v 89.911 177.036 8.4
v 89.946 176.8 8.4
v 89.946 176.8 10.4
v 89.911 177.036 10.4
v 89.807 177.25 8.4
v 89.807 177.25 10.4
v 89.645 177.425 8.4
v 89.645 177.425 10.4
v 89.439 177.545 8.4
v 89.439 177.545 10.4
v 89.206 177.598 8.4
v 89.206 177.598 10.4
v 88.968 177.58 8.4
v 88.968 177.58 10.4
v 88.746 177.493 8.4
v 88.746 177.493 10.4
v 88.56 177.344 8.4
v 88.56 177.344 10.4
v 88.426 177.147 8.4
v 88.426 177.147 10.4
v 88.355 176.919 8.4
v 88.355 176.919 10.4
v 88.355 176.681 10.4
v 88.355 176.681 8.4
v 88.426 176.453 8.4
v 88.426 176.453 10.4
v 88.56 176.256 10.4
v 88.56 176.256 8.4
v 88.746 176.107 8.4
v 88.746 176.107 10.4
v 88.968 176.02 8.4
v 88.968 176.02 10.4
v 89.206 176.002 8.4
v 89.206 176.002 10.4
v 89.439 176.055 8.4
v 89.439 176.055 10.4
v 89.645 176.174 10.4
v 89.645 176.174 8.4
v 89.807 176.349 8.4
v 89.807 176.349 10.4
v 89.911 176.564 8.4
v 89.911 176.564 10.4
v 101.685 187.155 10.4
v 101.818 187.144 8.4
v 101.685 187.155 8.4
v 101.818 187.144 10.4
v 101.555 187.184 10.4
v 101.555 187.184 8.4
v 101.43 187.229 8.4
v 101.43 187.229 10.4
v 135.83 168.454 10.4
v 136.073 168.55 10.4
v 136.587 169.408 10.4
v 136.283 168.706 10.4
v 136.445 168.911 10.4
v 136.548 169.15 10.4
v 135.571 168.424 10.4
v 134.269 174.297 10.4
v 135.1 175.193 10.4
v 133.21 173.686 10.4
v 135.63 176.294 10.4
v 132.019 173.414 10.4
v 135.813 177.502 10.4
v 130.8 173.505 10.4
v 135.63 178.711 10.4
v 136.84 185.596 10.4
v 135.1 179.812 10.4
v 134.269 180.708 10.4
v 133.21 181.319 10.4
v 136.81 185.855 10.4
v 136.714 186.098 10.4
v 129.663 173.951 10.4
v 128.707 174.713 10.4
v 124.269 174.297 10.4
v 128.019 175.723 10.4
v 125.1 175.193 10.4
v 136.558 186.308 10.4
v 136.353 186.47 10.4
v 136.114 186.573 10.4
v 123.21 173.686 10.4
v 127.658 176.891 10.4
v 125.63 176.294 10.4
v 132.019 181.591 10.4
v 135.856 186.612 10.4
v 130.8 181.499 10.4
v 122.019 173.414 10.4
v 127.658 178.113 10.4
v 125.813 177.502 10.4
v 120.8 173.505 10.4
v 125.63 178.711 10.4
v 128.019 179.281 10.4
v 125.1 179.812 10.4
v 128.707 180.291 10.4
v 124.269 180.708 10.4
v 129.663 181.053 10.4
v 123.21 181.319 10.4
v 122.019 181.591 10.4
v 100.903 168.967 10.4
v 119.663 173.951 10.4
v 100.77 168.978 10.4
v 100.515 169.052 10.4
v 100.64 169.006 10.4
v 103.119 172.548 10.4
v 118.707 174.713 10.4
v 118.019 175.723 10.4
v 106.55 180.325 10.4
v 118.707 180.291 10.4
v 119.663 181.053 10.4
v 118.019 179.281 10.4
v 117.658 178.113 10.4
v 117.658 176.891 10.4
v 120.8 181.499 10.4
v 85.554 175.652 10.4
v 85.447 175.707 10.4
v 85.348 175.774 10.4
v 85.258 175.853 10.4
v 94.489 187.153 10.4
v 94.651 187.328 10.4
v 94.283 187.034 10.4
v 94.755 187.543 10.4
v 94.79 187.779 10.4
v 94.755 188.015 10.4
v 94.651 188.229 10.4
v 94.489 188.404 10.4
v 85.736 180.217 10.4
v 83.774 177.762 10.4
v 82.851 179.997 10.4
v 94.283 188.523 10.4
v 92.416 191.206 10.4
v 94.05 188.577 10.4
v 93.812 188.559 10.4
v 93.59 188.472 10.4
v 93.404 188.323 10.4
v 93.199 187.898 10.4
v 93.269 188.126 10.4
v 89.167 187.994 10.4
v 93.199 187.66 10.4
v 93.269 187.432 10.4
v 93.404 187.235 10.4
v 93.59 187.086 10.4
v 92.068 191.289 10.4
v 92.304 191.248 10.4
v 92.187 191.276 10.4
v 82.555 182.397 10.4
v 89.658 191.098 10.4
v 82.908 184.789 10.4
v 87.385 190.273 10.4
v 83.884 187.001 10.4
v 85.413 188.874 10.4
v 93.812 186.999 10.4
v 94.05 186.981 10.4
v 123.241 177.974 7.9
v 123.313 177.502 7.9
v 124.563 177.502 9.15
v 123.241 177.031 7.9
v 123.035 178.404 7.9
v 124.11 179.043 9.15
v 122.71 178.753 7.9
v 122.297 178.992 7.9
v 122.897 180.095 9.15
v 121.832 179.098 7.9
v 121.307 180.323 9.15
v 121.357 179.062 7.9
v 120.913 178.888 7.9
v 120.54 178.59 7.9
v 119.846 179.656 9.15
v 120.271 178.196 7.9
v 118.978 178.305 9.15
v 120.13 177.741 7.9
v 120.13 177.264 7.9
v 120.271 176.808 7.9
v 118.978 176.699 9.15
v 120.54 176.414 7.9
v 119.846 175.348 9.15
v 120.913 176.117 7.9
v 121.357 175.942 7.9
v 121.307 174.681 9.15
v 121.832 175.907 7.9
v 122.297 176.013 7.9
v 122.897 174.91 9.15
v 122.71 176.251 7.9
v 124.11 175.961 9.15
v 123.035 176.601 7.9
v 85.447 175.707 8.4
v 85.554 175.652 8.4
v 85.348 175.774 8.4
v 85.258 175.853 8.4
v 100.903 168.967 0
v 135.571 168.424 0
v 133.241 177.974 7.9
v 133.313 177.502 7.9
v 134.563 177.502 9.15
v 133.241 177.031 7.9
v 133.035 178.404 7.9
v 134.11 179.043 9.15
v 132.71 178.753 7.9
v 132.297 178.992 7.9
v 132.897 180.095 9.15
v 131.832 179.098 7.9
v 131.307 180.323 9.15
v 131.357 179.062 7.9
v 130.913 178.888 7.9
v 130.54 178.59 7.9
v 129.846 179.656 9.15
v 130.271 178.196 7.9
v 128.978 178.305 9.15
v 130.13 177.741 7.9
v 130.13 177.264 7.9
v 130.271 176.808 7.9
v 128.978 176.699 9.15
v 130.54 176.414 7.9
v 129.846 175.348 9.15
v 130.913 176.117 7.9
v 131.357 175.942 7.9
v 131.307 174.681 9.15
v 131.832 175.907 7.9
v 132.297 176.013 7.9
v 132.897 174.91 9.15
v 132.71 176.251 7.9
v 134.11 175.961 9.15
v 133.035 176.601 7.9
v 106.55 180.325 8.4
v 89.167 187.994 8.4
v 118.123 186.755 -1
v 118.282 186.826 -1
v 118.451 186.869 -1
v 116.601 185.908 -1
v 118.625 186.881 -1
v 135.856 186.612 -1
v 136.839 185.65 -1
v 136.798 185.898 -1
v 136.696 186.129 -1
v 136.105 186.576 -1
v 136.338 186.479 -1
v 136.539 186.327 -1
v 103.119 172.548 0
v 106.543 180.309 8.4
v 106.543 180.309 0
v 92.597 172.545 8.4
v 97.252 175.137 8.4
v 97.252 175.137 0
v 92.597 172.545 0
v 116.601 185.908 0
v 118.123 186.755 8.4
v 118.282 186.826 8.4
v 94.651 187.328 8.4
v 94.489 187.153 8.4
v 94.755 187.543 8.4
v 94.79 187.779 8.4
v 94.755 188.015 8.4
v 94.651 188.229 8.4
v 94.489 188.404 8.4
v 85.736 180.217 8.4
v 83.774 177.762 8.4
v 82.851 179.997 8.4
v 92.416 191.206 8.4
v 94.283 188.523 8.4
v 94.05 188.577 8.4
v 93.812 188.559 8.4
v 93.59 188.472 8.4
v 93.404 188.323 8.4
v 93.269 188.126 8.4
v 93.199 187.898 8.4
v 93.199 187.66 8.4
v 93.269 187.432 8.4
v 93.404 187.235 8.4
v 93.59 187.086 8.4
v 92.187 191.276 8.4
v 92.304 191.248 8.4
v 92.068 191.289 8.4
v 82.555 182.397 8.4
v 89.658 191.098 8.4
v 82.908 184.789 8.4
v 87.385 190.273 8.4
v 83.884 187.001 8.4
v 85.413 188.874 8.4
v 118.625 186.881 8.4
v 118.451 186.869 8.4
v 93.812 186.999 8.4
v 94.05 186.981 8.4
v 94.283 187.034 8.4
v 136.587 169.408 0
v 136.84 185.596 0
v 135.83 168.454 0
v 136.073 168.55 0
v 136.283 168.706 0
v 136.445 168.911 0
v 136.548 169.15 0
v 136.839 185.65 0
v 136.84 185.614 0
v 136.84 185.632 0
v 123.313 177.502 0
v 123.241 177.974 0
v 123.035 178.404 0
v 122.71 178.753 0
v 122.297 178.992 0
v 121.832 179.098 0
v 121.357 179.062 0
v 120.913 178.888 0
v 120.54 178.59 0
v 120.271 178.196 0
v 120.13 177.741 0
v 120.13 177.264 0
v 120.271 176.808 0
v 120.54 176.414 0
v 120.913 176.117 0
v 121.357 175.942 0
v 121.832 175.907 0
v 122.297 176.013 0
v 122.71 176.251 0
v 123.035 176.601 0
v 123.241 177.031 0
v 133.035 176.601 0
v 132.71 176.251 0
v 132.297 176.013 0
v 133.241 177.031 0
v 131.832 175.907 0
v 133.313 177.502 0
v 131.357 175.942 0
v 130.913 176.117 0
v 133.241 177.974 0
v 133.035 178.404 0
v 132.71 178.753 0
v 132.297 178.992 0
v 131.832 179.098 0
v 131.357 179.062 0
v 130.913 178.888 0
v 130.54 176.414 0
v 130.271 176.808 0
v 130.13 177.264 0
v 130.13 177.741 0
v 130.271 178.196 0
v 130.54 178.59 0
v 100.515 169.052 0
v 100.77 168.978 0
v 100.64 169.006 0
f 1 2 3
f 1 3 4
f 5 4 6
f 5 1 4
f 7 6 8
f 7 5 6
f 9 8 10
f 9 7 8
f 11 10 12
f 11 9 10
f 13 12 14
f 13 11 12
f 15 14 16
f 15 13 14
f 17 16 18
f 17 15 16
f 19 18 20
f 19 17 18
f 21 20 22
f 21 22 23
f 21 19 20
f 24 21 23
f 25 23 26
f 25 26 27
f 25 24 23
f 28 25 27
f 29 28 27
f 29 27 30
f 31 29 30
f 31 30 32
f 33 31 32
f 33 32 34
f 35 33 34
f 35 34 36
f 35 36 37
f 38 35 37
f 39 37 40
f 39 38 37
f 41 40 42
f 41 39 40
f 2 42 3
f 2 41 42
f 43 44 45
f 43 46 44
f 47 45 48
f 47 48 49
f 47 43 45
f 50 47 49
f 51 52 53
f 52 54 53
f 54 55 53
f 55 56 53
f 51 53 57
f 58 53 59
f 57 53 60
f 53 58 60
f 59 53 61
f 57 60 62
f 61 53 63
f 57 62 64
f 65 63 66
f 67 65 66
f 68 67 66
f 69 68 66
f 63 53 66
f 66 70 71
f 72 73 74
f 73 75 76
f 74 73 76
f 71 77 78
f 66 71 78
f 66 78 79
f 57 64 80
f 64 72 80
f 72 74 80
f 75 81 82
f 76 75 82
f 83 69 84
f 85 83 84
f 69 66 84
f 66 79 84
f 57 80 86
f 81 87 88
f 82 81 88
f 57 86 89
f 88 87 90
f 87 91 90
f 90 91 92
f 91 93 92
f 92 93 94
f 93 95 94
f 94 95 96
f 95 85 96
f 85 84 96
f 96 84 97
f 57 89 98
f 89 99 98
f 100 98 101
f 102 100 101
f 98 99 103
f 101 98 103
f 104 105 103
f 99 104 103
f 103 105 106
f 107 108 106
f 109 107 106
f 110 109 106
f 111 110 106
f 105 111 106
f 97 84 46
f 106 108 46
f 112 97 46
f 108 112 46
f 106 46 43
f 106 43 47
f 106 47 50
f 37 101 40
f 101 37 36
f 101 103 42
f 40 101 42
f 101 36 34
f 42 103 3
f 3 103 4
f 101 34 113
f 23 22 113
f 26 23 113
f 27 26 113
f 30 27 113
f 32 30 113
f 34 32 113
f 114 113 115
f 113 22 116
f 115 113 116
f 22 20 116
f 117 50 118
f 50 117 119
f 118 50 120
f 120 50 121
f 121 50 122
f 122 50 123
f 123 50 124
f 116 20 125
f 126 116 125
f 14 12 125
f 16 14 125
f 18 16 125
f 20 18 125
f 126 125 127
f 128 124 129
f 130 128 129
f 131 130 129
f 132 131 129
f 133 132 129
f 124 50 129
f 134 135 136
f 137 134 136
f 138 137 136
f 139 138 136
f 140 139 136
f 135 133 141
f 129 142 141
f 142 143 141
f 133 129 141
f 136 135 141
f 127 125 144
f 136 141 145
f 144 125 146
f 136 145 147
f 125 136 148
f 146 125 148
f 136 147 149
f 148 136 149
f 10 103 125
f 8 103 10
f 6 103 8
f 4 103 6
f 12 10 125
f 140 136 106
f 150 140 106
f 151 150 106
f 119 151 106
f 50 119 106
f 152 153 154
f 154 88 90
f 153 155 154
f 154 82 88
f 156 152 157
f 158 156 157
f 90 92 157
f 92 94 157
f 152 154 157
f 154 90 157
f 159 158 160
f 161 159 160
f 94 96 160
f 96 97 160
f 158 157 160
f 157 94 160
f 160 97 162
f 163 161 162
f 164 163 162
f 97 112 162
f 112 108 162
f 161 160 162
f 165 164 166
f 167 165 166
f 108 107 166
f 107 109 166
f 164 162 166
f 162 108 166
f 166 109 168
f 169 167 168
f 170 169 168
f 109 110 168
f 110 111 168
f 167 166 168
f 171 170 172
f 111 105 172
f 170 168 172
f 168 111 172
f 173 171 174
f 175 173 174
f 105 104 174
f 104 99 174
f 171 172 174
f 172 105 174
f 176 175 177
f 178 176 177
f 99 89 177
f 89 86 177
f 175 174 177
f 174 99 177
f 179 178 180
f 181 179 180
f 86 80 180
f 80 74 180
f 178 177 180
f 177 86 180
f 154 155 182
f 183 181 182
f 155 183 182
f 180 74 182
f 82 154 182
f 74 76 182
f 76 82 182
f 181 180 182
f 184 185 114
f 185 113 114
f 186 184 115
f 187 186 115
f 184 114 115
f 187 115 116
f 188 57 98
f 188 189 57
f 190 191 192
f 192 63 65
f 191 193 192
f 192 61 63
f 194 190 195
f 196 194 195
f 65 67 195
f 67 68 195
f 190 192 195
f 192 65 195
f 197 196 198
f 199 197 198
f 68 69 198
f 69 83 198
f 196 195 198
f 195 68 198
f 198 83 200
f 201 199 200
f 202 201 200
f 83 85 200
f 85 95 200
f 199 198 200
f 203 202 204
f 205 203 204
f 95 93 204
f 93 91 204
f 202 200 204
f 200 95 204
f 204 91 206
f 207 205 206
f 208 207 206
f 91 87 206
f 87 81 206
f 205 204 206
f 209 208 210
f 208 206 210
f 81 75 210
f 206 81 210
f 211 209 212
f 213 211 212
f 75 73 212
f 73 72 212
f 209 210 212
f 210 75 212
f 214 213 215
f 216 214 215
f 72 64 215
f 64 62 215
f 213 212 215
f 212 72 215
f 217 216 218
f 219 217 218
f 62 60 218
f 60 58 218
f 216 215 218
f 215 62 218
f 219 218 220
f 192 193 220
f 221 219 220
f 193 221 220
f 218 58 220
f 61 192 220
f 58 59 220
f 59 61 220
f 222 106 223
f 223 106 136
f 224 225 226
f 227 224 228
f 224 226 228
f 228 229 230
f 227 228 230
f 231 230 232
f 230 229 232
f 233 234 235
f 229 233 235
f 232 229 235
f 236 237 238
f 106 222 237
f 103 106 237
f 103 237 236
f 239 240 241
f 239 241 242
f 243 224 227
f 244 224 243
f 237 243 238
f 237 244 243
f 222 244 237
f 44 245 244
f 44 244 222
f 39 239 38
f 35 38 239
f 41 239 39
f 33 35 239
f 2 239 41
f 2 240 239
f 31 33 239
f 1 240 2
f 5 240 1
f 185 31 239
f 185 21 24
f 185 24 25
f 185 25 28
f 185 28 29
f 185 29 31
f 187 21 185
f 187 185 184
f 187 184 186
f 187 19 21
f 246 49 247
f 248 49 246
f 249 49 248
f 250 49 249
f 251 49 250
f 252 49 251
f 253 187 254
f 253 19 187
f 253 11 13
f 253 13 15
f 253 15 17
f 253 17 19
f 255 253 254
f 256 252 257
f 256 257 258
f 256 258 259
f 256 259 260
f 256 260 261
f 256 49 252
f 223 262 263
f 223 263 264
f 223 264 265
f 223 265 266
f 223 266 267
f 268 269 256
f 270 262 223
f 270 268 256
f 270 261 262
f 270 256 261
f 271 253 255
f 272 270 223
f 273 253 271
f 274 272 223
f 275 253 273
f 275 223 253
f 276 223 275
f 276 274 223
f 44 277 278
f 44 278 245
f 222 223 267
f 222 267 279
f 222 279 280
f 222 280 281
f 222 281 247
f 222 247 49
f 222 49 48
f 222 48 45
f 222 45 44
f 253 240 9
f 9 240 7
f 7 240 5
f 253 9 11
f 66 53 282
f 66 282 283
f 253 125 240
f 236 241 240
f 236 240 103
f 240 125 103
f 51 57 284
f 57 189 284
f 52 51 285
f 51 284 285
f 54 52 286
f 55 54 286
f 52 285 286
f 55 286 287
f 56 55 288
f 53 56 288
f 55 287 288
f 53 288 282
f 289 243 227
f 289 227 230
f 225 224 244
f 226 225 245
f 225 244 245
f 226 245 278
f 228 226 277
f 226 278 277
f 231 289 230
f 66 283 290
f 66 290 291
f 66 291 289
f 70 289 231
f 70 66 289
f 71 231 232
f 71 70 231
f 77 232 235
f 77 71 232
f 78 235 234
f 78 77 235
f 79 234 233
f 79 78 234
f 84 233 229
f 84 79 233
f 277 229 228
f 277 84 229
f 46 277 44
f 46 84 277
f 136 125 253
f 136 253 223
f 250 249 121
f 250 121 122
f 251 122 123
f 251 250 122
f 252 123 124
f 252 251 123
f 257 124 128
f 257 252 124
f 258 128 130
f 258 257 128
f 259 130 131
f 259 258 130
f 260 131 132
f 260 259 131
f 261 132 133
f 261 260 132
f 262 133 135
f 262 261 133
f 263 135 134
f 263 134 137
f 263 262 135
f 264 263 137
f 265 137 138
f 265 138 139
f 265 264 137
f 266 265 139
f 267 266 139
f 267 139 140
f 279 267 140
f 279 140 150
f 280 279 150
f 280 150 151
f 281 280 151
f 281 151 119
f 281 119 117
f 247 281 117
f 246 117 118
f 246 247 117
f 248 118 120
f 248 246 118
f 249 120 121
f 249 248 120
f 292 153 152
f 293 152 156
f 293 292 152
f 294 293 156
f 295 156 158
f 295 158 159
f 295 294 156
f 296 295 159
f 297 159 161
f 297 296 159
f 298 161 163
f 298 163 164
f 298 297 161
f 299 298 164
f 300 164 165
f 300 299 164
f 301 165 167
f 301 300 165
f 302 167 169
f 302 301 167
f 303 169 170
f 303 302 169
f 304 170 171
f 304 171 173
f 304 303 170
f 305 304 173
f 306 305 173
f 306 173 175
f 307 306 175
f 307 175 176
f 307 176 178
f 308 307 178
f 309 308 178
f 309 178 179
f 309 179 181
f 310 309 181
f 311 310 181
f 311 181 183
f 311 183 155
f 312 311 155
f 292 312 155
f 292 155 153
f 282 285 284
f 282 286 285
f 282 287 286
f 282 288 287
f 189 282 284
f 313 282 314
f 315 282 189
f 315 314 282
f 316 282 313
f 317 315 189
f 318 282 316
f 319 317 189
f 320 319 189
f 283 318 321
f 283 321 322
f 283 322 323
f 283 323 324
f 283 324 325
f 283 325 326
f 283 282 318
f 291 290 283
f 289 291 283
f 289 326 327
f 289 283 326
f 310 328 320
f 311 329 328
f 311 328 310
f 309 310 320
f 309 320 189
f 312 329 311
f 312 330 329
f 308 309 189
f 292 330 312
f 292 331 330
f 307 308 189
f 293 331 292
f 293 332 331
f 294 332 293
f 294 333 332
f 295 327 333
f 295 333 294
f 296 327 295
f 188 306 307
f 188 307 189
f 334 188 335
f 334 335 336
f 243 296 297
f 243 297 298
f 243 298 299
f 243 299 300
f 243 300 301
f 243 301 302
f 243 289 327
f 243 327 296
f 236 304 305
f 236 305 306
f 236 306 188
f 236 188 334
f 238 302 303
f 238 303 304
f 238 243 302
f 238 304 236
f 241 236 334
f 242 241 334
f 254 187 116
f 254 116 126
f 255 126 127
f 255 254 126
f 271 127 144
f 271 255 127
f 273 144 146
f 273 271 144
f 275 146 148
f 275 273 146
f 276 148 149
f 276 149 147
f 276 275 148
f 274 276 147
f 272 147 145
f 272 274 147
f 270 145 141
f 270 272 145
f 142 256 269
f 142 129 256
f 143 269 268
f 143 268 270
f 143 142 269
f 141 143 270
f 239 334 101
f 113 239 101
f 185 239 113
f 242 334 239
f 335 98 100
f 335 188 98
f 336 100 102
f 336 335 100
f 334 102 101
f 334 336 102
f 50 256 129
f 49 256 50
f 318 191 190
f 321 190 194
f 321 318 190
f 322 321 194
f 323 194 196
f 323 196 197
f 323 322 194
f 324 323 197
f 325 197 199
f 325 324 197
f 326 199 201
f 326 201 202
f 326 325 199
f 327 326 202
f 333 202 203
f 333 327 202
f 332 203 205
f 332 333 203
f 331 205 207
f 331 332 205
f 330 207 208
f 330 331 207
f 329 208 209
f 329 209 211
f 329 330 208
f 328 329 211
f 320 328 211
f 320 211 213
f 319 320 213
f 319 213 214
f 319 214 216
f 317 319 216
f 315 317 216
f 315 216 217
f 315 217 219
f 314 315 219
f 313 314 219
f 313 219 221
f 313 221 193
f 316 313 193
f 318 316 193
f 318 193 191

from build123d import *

# Parameters (mm, degrees)
SKETCH7_R           = 1.5999999999999968
SKETCH7_R_2         = 1.6000000000000103
BOSS_EXTRUDE4_DEPTH = 8.4
SKETCH8_R           = 1.600000000000002
SKETCH8_R_2         = 1.5999999999999888
SKETCH8_R_3         = 0.7999999999999944
BOSS_EXTRUDE5_DEPTH = 2
BOSS_EXTRUDE6_DEPTH = 1
CHAMFER1_SIZE       = 2.5
FILLET1_R           = 1
CUT_EXTRUDE1_DEPTH  = 20


with BuildPart() as part:
    # Sketch7 → Boss-Extrude4 (new body)
    with BuildSketch(Plane.XY):
        Polygon((100.70057064402273, 168.9698255115625), (92.5965029309412, 172.54522201163132), (118.3568955070623, 186.88533735497072), (136.85548909280223, 186.59587048571208), (136.570892648763, 168.40852501258752), align=None)
        with Locations((131.71257875478256, 177.50219774914976)):
            Circle(SKETCH7_R, mode=Mode.SUBTRACT)
        with Locations((121.71257875478257, 177.50219774914976)):
            Circle(SKETCH7_R_2, mode=Mode.SUBTRACT)
    extrude(amount=BOSS_EXTRUDE4_DEPTH)

    # Sketch8 → Boss-Extrude5 (add)
    with BuildSketch(Plane.XY.offset(8.4)):
        with BuildLine():
            Line((101.6151007105908, 187.14731375350308), (136.85548909280223, 186.59587048571208))
            Line((136.85548909280223, 186.59587048571208), (136.570892648763, 168.40852501258752))
            Line((136.570892648763, 168.40852501258752), (100.70057064402273, 168.96982551156256))
            Line((100.70057064402273, 168.96982551156256), (85.39263791538717, 175.72346220846532))
            ThreePointArc((85.39263791538717, 175.72346220846532), (83.32145188451928, 185.9277220686207), (92.25463791536886, 191.27701344283787))
            Line((92.25463791536886, 191.27701344283787), (101.6151007105908, 187.14731375350308))
        make_face()
        with Locations((121.71257875478257, 177.50219774914976)):
            Circle(SKETCH8_R, mode=Mode.SUBTRACT)
        with Locations((131.71257875478256, 177.50219774914976)):
            Circle(SKETCH8_R_2, mode=Mode.SUBTRACT)
        with Locations((93.99026460379022, 187.77878532013932)):
            Circle(SKETCH8_R_3, mode=Mode.SUBTRACT)
        with Locations((89.1464998979208, 176.79980797822924)):
            Circle(SKETCH8_R_3, mode=Mode.SUBTRACT)
    extrude(amount=BOSS_EXTRUDE5_DEPTH)

    # Sketch9 → Boss-Extrude6 (add)
    with BuildSketch(Plane(origin=(0, 0, 0), x_dir=(-1, 0, 0), z_dir=(0, 0, -1))):
        Polygon((-136.8406818403388, 185.64960210569163), (-136.85548909280223, 186.59587048571208), (-118.3568955070623, 186.88533735497072), (-116.60058674528226, 185.9076476653427), align=None)
    extrude(amount=BOSS_EXTRUDE6_DEPTH)

    # Chamfer1
    chamfer1_edges = [part.edges().sort_by_distance(p)[0] for p in [
        (120.11257875478256, 177.50219774914976, 10.4),
        (130.11257875478256, 177.50219774914976, 10.4),
    ]]
    chamfer(chamfer1_edges, length=CHAMFER1_SIZE)

    # Fillet1
    fillet1_edges = [part.edges().sort_by_distance(p)[0] for p in [
        (92.25463791536886, 191.27701344283787, 9.4),
        (85.39263791538717, 175.72346220846532, 9.4),
        (136.85548909280223, 186.59587048571208, 4.7),
        (136.570892648763, 168.40852501258752, 5.2),
        (100.70057064402273, 168.96982551156253, 5.2),
        (101.6151007105908, 187.14731375350308, 9.4),
        (118.3568955070623, 186.88533735497072, 3.7),
    ]]
    fillet(fillet1_edges, radius=FILLET1_R)

    # Sketch10 → Cut-Extrude1 (cut)
    with BuildSketch(Plane.XY.offset(10.400000000000002)):
        Polygon((93.96999875407636, 176.58449707589014), (85.73576574764382, 180.21732060529217), (89.16676574763467, 187.99409622247845), (97.40099875406719, 184.3612726930764), (106.55014653899221, 180.32480210485187), (103.11914653900139, 172.54802648766562), align=None)
    extrude(amount=-CUT_EXTRUDE1_DEPTH, mode=Mode.SUBTRACT)


solid = part.part
